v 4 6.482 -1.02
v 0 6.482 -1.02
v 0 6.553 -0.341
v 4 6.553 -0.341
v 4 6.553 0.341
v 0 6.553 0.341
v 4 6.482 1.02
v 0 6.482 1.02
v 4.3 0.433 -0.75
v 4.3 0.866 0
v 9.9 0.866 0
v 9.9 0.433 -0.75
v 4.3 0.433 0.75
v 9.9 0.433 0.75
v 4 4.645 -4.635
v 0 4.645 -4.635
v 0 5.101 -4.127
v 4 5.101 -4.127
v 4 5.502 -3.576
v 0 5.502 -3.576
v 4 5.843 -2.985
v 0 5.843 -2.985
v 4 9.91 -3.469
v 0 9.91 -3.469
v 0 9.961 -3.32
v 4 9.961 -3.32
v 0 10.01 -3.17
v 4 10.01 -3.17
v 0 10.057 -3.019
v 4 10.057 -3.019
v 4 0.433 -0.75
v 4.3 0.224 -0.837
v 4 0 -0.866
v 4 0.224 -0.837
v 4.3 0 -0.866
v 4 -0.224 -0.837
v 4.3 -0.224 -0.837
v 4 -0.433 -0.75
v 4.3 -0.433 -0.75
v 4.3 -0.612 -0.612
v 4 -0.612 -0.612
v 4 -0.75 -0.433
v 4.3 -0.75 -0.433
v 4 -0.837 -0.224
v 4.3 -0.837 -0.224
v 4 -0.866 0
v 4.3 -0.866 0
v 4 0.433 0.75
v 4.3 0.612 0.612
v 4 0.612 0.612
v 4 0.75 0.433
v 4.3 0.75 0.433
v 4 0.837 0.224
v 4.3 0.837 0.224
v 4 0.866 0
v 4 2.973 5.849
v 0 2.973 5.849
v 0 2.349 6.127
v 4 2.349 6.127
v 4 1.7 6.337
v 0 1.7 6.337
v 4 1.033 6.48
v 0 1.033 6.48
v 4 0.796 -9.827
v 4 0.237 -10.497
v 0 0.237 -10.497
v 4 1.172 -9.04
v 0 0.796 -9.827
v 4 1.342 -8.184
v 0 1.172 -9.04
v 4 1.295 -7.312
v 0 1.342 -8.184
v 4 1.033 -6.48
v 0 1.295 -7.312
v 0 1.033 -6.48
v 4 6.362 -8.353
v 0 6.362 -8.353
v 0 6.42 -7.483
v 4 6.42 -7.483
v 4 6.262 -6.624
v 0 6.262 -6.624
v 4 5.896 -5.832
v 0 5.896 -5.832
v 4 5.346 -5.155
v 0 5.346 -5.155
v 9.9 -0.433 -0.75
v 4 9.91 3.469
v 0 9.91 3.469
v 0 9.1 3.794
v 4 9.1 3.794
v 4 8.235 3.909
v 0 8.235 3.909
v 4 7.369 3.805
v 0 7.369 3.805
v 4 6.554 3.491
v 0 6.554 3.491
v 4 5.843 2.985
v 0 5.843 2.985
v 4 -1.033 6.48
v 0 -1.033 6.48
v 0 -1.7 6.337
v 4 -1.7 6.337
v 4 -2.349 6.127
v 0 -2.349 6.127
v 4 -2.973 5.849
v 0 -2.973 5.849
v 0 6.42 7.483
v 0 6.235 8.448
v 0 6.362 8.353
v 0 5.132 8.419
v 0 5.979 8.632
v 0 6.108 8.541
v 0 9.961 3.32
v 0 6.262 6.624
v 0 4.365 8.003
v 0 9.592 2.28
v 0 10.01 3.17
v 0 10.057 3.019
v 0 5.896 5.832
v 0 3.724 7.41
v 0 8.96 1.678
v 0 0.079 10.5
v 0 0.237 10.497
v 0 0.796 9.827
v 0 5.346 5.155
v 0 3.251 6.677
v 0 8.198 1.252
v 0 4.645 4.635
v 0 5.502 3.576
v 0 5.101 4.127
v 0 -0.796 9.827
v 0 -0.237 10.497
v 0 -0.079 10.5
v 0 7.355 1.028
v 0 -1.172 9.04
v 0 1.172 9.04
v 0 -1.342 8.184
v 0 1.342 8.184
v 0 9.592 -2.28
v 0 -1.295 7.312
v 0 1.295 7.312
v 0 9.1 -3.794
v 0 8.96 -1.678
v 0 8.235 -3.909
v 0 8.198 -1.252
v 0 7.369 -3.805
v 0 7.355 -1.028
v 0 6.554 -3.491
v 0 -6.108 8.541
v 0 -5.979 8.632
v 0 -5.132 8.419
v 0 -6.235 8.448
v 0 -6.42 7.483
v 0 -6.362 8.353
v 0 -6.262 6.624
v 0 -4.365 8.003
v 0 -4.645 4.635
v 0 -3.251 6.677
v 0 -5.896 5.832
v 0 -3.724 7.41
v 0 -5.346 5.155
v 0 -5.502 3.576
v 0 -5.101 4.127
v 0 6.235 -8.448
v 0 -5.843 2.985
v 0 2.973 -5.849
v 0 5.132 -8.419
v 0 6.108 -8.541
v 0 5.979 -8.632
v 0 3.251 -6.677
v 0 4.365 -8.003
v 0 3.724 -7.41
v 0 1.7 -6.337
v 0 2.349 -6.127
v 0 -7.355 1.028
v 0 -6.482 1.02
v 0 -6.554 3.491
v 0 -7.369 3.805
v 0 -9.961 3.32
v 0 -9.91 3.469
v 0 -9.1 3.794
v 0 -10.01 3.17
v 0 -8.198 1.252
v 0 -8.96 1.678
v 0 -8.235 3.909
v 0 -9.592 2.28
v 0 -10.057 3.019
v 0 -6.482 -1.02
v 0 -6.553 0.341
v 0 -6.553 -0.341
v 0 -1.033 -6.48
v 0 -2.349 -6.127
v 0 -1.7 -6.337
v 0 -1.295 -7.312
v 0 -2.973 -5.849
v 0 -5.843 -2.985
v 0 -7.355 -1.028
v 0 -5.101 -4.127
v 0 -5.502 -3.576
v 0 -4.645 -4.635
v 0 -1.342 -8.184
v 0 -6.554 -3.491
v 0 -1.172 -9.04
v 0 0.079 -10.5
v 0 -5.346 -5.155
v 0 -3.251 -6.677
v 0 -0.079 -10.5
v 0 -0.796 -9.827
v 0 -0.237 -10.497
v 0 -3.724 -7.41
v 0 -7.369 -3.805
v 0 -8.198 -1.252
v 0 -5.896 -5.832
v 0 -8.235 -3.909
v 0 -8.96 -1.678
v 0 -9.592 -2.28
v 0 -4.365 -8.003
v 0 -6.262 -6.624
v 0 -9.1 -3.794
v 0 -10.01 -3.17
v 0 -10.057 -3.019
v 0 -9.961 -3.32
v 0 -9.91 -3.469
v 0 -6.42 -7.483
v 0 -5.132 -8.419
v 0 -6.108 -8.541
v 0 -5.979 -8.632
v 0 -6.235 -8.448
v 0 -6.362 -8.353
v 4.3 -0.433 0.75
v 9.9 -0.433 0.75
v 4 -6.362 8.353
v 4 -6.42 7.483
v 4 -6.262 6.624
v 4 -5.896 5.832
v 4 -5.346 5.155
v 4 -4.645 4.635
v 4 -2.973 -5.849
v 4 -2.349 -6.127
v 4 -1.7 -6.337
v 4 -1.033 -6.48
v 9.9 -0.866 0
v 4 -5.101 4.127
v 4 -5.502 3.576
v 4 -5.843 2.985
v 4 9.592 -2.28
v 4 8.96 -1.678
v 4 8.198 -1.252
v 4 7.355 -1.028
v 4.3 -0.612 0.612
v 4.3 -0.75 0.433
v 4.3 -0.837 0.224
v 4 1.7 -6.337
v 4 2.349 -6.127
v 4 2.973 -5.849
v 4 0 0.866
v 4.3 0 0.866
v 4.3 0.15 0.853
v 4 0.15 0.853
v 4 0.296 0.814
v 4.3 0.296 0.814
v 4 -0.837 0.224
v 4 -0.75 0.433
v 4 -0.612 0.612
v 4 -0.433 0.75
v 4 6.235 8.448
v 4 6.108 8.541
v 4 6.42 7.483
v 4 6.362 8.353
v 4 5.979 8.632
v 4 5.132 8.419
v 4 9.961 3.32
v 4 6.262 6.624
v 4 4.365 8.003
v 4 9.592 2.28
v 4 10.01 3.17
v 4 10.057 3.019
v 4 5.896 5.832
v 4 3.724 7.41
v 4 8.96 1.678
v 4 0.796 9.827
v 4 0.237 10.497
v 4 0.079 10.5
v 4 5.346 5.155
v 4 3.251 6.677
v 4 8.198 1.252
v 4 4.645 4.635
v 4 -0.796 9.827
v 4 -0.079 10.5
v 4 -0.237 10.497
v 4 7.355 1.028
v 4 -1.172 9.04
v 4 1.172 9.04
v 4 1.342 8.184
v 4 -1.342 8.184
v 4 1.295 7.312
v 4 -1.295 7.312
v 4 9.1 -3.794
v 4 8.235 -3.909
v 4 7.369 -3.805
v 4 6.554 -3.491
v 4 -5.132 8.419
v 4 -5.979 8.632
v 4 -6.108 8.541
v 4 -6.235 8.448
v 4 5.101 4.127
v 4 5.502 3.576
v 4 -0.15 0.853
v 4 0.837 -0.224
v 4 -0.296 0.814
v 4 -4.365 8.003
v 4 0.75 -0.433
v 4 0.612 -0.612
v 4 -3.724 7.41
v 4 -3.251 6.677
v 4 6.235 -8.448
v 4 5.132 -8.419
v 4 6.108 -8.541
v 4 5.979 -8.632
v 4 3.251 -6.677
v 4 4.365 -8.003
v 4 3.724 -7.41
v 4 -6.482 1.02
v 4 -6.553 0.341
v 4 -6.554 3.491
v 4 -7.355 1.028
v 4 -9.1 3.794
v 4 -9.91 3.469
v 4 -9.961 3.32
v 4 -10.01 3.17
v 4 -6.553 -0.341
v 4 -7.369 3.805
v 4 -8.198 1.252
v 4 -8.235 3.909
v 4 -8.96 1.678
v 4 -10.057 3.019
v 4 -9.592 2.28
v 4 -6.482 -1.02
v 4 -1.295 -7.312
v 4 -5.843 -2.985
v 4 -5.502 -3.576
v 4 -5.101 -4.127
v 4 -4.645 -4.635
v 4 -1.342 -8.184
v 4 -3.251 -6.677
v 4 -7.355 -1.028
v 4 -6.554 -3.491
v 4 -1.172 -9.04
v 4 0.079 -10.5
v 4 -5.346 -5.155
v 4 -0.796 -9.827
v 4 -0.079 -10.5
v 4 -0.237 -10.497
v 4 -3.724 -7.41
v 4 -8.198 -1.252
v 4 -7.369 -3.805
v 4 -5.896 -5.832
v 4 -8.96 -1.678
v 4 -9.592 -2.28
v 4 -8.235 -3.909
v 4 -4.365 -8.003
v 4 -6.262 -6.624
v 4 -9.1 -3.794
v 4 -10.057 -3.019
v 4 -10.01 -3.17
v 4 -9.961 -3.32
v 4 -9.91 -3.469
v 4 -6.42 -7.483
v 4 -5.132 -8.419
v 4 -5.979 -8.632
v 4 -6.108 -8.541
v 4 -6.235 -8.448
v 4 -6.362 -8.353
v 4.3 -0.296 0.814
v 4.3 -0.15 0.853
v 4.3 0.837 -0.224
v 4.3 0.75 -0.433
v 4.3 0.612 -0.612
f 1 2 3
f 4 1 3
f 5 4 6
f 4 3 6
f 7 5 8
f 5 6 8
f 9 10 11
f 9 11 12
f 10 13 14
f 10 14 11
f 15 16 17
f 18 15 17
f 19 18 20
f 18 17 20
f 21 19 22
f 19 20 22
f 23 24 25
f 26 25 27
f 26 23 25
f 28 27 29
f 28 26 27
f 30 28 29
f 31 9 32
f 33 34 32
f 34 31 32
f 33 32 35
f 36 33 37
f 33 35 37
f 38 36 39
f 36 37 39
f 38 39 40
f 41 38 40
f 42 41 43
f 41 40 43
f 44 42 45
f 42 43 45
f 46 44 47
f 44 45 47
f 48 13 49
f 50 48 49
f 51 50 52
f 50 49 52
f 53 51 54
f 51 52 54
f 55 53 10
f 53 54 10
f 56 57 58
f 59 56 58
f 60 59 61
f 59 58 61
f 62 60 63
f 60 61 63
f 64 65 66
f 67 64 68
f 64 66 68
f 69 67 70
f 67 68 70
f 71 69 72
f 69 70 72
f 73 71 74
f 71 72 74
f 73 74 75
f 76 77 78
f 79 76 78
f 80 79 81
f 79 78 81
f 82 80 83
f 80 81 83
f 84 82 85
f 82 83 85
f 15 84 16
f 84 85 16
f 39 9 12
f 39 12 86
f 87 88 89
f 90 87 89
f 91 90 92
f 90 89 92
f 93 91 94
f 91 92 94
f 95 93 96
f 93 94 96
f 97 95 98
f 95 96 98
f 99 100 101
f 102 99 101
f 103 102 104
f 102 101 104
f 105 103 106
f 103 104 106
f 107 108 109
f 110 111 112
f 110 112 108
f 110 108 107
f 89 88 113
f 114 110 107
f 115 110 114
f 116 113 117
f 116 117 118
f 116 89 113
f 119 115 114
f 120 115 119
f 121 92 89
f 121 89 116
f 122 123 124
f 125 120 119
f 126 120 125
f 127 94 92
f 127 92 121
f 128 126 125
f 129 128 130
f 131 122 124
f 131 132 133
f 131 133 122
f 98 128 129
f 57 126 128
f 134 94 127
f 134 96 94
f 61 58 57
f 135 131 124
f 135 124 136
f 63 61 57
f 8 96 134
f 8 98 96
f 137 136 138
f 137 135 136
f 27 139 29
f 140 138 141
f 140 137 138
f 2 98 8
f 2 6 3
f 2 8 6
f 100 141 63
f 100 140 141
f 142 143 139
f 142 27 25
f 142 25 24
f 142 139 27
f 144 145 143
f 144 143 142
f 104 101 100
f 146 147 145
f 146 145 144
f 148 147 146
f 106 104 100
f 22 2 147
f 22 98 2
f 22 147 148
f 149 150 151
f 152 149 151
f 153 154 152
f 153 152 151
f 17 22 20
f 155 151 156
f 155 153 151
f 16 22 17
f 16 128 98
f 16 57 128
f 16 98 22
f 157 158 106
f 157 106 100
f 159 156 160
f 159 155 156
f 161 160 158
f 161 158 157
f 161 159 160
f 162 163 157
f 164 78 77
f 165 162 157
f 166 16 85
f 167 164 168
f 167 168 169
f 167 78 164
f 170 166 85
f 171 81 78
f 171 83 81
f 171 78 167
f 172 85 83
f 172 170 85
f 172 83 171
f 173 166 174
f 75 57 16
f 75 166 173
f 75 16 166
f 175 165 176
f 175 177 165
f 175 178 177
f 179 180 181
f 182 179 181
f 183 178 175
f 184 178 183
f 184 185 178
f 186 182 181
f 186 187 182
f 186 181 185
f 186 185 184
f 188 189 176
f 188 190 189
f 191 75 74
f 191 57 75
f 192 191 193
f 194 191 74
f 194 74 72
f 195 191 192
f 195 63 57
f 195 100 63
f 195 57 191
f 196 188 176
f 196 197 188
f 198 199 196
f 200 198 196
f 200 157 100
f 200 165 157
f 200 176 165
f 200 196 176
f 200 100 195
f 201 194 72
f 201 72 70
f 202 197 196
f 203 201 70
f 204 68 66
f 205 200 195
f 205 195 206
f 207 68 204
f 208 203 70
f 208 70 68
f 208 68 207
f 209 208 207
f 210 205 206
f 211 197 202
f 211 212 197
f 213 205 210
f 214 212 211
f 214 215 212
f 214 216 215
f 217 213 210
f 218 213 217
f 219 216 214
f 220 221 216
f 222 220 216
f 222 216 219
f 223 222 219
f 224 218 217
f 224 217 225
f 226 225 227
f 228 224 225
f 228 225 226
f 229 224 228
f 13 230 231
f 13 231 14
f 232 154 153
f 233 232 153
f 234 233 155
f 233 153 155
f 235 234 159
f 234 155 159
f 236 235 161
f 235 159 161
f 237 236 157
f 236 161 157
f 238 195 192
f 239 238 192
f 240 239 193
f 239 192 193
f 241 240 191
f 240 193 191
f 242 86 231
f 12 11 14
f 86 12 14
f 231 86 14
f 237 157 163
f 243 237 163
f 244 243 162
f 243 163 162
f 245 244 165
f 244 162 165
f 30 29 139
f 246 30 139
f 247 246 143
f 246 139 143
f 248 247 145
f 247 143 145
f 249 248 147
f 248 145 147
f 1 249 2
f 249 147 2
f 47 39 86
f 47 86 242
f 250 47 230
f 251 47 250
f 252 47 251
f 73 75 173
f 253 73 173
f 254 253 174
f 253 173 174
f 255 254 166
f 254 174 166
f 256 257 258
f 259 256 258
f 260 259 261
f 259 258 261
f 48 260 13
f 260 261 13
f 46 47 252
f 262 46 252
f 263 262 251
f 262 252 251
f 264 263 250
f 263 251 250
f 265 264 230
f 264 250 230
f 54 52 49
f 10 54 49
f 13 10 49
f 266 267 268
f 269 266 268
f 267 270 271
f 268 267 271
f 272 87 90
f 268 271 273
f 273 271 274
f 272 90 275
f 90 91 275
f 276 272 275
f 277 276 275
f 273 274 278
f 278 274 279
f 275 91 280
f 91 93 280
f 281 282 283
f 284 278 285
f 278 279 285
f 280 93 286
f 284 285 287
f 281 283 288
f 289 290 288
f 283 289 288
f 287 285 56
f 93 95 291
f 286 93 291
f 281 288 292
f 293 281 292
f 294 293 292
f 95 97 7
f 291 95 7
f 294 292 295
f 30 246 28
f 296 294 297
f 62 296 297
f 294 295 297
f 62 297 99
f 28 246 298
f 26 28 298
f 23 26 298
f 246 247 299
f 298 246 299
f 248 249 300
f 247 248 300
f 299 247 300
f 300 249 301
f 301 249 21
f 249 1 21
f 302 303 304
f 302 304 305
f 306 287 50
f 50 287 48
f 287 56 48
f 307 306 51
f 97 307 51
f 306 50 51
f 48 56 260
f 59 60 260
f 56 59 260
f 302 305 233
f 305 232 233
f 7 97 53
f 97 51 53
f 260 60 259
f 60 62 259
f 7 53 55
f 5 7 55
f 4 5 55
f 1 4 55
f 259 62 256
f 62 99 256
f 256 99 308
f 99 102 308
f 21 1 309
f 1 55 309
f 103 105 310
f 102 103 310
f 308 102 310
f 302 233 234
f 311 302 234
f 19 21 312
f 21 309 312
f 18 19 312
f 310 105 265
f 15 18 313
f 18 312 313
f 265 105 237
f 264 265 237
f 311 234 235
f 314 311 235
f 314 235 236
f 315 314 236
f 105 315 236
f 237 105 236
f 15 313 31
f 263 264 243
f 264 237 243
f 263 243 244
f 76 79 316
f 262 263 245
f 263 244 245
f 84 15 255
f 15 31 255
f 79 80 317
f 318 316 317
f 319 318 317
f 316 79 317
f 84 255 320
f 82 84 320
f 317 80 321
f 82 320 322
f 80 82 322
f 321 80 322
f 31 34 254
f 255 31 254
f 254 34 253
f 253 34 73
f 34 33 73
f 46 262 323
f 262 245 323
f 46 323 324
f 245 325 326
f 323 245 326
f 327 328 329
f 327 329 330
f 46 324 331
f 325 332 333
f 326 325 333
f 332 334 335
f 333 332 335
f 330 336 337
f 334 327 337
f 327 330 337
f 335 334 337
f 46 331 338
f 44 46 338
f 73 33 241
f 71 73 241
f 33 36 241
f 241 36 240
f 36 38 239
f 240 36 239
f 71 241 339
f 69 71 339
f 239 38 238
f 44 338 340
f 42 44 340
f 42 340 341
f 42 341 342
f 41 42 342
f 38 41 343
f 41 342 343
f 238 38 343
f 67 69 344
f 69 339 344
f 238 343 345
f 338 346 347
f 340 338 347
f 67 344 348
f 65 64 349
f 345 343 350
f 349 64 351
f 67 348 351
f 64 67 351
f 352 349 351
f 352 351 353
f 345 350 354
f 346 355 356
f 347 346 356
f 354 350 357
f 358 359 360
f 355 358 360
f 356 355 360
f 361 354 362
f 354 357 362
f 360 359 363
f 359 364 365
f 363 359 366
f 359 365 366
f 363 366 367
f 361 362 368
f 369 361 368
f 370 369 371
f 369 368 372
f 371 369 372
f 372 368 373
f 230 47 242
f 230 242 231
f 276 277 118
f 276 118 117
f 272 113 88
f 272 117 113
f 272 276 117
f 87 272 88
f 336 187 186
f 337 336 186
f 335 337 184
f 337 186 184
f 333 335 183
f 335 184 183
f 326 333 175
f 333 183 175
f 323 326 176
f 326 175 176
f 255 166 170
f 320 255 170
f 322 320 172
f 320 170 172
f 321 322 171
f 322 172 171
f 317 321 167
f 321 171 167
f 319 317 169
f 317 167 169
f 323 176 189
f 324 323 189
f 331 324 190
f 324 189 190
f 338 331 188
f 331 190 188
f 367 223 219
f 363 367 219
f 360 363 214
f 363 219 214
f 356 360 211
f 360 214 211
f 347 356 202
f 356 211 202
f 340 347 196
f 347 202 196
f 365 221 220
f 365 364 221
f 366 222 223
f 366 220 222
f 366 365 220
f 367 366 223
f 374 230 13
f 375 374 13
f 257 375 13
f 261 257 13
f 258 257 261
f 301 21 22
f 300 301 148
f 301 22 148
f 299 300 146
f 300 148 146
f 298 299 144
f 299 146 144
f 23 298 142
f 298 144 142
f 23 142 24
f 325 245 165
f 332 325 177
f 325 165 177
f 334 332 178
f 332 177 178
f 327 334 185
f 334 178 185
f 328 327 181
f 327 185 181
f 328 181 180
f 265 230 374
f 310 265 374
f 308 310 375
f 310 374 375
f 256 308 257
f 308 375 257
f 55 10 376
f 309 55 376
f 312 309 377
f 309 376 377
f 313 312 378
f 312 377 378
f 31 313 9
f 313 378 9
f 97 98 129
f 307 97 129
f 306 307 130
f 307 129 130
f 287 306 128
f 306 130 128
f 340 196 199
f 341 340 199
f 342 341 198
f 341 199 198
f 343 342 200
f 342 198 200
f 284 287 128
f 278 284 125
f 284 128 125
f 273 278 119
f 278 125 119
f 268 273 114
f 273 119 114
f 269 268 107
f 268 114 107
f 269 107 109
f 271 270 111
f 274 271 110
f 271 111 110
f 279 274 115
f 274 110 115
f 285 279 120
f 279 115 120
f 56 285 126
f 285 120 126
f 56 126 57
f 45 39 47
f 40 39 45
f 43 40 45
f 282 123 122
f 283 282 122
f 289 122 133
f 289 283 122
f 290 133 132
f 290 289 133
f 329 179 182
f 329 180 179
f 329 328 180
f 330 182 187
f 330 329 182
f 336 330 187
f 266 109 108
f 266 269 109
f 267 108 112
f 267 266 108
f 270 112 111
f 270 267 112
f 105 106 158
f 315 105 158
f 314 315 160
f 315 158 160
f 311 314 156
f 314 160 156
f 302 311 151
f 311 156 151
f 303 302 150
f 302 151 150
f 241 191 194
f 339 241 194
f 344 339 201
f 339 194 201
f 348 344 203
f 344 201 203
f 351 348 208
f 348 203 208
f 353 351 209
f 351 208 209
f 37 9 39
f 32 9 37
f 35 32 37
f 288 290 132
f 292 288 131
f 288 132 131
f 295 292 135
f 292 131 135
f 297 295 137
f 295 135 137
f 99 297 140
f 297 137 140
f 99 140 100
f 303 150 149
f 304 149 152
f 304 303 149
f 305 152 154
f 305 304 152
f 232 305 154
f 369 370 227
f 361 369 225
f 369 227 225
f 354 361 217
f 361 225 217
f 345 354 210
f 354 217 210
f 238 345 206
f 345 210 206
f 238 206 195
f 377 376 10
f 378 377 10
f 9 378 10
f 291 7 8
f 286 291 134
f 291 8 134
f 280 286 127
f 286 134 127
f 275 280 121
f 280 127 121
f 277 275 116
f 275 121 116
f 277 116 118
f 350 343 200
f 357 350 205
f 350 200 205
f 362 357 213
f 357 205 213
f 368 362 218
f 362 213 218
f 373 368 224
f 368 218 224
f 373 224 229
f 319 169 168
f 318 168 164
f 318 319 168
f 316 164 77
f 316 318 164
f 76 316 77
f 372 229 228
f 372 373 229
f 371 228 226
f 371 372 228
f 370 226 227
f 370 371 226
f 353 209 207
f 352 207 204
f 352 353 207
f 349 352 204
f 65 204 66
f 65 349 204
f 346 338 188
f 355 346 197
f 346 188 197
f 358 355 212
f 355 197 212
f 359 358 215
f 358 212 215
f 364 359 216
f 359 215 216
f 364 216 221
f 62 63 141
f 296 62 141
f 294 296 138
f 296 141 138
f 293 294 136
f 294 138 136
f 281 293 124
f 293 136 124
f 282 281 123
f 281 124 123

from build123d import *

# Parameters (mm, degrees)
BASPROSKE_W         = 4
BASPROSKE_H         = 10.5
TOOTHCUT_DEPTH      = 16.378556499
TEETHCUTS_COUNT     = 10
TEETHCUTS_ANGLE     = 324
BORSKE_R            = 0.5
BORE_DEPTH          = 50.0000508
SKETCH2_R           = 0.866025404
BOSS_EXTRUDE1_DEPTH = 4.3
BOSS_EXTRUDE2_DEPTH = 9.9


with BuildPart() as part:
    # BasProSke → Base-Revolve (revolve)
    with BuildSketch(Plane(origin=(0, 0, 0), x_dir=(1, 0, 0), z_dir=(0, 1, 0))):
        with Locations((2, 5.25)):
            Rectangle(BASPROSKE_W, BASPROSKE_H)
    revolve(axis=Axis((-10, 0, 0), (1, 0, 0)))

    # TooCutSke → ToothCut (cut, through all)
    with BuildSketch(Plane(origin=(0, 0, 0), x_dir=(0, 0, -1), z_dir=(1, 0, 0))):
        with BuildLine():
            ThreePointArc((1.019600066, 6.481797432), (0, 6.5615), (-1.019600066, 6.481797432))
            ThreePointArc((-1.019600066, 6.481797432), (-1.451036104, 8.608938557), (-3.053606956, 10.072712133))
            ThreePointArc((-3.053606956, 10.072712133), (0, 10.5254), (3.053606956, 10.072712133))
            ThreePointArc((3.053606956, 10.072712133), (1.451036104, 8.608938557), (1.019600066, 6.481797432))
        make_face()
    toothcut = extrude(amount=TOOTHCUT_DEPTH, mode=Mode.SUBTRACT)

    # TeethCuts: ToothCut ×10 about axis
    teethcuts_axis = Axis((-10, 0, 0), (1, 0, 0))
    for i in range(1, TEETHCUTS_COUNT):
        add(toothcut.rotate(teethcuts_axis, i * TEETHCUTS_ANGLE / (TEETHCUTS_COUNT - 1)), mode=Mode.SUBTRACT)

    # BorSke → Bore (cut, symmetric)
    with BuildSketch(Plane(origin=(0, 0, 0), x_dir=(0, 0, -1), z_dir=(1, 0, 0))):
        Circle(BORSKE_R)
    extrude(amount=BORE_DEPTH, both=True, mode=Mode.SUBTRACT)

    # Sketch2 → Boss-Extrude1 (add)
    with BuildSketch(Plane.ZY):
        Circle(SKETCH2_R)
    extrude(amount=-BOSS_EXTRUDE1_DEPTH)

    # Sketch2<3> → Boss-Extrude2 (add)
    with BuildSketch(Plane.ZY):
        Polygon((0.75, -0.433012702), (0.75, 0.433012702), (0, 0.866025404), (-0.75, 0.433012702), (-0.75, -0.433012702), (0, -0.866025404), align=None)
    extrude(amount=-BOSS_EXTRUDE2_DEPTH)


solid = part.part
